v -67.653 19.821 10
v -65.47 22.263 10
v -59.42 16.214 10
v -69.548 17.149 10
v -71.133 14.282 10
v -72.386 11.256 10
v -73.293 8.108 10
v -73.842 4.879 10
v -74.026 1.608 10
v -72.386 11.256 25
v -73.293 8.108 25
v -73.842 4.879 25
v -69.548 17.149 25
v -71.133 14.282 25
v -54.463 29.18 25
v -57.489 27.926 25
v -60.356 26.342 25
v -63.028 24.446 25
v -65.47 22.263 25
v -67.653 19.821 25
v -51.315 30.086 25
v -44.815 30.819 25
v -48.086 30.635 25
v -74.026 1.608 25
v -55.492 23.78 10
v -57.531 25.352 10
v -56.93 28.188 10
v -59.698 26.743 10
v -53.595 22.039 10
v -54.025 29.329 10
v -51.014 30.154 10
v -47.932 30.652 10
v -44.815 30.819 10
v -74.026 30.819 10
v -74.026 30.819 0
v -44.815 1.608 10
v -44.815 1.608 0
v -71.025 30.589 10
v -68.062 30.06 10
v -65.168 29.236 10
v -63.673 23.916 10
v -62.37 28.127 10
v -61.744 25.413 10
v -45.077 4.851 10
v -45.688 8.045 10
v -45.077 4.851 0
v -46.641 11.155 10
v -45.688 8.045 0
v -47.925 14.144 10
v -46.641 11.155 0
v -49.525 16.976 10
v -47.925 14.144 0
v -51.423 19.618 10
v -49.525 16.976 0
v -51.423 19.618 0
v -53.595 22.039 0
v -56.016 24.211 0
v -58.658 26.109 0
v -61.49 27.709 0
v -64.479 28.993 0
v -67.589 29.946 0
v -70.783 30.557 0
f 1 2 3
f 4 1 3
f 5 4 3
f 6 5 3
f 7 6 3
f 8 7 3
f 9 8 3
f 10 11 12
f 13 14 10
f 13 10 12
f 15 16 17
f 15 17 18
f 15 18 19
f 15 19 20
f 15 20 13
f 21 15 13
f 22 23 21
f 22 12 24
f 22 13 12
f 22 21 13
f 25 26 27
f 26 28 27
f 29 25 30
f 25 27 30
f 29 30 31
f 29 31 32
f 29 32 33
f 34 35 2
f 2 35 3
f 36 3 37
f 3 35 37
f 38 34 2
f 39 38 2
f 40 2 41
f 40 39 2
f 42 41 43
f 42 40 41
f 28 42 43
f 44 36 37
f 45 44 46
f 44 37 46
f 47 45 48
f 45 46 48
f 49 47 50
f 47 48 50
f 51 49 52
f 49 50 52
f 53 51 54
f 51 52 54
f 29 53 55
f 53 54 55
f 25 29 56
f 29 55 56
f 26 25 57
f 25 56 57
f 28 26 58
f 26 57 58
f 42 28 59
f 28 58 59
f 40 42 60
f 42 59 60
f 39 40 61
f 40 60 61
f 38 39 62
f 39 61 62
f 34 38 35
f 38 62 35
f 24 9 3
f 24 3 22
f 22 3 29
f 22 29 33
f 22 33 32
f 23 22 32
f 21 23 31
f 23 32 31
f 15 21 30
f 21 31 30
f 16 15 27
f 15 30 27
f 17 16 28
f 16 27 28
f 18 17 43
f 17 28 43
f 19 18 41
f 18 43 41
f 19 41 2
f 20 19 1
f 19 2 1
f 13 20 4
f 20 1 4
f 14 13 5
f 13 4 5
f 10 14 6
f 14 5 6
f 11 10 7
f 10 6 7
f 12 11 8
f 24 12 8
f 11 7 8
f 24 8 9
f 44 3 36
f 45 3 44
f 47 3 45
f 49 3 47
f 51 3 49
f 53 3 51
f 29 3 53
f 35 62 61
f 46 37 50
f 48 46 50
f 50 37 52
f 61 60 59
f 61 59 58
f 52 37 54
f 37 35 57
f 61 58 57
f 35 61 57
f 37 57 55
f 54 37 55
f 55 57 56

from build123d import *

# Parameters (mm, degrees)
BOSS_EXTRUDE1_DEPTH = 10
BOSS_EXTRUDE2_DEPTH = 15


with BuildPart() as part:
    # Sketch1 → Boss-Extrude1 (new body)
    with BuildSketch(Plane.XY):
        with BuildLine():
            Line((-74.025675485, 30.818815331), (-44.815154686, 1.608294532))
            ThreePointArc((-44.815154686, 1.608294532), (-53.594607127, 22.03936289), (-74.025675485, 30.818815331))
        make_face()
    extrude(amount=BOSS_EXTRUDE1_DEPTH)

    # Sketch3 → Boss-Extrude2 (add)
    with BuildSketch(Plane.XY.offset(10)):
        with BuildLine():
            Line((-74.025675485, 1.608294532), (-44.815154686, 30.818815331))
            ThreePointArc((-44.815154686, 30.818815331), (-65.470112025, 22.263251871), (-74.025675485, 1.608294532))
        make_face()
    extrude(amount=BOSS_EXTRUDE2_DEPTH)


solid = part.part
